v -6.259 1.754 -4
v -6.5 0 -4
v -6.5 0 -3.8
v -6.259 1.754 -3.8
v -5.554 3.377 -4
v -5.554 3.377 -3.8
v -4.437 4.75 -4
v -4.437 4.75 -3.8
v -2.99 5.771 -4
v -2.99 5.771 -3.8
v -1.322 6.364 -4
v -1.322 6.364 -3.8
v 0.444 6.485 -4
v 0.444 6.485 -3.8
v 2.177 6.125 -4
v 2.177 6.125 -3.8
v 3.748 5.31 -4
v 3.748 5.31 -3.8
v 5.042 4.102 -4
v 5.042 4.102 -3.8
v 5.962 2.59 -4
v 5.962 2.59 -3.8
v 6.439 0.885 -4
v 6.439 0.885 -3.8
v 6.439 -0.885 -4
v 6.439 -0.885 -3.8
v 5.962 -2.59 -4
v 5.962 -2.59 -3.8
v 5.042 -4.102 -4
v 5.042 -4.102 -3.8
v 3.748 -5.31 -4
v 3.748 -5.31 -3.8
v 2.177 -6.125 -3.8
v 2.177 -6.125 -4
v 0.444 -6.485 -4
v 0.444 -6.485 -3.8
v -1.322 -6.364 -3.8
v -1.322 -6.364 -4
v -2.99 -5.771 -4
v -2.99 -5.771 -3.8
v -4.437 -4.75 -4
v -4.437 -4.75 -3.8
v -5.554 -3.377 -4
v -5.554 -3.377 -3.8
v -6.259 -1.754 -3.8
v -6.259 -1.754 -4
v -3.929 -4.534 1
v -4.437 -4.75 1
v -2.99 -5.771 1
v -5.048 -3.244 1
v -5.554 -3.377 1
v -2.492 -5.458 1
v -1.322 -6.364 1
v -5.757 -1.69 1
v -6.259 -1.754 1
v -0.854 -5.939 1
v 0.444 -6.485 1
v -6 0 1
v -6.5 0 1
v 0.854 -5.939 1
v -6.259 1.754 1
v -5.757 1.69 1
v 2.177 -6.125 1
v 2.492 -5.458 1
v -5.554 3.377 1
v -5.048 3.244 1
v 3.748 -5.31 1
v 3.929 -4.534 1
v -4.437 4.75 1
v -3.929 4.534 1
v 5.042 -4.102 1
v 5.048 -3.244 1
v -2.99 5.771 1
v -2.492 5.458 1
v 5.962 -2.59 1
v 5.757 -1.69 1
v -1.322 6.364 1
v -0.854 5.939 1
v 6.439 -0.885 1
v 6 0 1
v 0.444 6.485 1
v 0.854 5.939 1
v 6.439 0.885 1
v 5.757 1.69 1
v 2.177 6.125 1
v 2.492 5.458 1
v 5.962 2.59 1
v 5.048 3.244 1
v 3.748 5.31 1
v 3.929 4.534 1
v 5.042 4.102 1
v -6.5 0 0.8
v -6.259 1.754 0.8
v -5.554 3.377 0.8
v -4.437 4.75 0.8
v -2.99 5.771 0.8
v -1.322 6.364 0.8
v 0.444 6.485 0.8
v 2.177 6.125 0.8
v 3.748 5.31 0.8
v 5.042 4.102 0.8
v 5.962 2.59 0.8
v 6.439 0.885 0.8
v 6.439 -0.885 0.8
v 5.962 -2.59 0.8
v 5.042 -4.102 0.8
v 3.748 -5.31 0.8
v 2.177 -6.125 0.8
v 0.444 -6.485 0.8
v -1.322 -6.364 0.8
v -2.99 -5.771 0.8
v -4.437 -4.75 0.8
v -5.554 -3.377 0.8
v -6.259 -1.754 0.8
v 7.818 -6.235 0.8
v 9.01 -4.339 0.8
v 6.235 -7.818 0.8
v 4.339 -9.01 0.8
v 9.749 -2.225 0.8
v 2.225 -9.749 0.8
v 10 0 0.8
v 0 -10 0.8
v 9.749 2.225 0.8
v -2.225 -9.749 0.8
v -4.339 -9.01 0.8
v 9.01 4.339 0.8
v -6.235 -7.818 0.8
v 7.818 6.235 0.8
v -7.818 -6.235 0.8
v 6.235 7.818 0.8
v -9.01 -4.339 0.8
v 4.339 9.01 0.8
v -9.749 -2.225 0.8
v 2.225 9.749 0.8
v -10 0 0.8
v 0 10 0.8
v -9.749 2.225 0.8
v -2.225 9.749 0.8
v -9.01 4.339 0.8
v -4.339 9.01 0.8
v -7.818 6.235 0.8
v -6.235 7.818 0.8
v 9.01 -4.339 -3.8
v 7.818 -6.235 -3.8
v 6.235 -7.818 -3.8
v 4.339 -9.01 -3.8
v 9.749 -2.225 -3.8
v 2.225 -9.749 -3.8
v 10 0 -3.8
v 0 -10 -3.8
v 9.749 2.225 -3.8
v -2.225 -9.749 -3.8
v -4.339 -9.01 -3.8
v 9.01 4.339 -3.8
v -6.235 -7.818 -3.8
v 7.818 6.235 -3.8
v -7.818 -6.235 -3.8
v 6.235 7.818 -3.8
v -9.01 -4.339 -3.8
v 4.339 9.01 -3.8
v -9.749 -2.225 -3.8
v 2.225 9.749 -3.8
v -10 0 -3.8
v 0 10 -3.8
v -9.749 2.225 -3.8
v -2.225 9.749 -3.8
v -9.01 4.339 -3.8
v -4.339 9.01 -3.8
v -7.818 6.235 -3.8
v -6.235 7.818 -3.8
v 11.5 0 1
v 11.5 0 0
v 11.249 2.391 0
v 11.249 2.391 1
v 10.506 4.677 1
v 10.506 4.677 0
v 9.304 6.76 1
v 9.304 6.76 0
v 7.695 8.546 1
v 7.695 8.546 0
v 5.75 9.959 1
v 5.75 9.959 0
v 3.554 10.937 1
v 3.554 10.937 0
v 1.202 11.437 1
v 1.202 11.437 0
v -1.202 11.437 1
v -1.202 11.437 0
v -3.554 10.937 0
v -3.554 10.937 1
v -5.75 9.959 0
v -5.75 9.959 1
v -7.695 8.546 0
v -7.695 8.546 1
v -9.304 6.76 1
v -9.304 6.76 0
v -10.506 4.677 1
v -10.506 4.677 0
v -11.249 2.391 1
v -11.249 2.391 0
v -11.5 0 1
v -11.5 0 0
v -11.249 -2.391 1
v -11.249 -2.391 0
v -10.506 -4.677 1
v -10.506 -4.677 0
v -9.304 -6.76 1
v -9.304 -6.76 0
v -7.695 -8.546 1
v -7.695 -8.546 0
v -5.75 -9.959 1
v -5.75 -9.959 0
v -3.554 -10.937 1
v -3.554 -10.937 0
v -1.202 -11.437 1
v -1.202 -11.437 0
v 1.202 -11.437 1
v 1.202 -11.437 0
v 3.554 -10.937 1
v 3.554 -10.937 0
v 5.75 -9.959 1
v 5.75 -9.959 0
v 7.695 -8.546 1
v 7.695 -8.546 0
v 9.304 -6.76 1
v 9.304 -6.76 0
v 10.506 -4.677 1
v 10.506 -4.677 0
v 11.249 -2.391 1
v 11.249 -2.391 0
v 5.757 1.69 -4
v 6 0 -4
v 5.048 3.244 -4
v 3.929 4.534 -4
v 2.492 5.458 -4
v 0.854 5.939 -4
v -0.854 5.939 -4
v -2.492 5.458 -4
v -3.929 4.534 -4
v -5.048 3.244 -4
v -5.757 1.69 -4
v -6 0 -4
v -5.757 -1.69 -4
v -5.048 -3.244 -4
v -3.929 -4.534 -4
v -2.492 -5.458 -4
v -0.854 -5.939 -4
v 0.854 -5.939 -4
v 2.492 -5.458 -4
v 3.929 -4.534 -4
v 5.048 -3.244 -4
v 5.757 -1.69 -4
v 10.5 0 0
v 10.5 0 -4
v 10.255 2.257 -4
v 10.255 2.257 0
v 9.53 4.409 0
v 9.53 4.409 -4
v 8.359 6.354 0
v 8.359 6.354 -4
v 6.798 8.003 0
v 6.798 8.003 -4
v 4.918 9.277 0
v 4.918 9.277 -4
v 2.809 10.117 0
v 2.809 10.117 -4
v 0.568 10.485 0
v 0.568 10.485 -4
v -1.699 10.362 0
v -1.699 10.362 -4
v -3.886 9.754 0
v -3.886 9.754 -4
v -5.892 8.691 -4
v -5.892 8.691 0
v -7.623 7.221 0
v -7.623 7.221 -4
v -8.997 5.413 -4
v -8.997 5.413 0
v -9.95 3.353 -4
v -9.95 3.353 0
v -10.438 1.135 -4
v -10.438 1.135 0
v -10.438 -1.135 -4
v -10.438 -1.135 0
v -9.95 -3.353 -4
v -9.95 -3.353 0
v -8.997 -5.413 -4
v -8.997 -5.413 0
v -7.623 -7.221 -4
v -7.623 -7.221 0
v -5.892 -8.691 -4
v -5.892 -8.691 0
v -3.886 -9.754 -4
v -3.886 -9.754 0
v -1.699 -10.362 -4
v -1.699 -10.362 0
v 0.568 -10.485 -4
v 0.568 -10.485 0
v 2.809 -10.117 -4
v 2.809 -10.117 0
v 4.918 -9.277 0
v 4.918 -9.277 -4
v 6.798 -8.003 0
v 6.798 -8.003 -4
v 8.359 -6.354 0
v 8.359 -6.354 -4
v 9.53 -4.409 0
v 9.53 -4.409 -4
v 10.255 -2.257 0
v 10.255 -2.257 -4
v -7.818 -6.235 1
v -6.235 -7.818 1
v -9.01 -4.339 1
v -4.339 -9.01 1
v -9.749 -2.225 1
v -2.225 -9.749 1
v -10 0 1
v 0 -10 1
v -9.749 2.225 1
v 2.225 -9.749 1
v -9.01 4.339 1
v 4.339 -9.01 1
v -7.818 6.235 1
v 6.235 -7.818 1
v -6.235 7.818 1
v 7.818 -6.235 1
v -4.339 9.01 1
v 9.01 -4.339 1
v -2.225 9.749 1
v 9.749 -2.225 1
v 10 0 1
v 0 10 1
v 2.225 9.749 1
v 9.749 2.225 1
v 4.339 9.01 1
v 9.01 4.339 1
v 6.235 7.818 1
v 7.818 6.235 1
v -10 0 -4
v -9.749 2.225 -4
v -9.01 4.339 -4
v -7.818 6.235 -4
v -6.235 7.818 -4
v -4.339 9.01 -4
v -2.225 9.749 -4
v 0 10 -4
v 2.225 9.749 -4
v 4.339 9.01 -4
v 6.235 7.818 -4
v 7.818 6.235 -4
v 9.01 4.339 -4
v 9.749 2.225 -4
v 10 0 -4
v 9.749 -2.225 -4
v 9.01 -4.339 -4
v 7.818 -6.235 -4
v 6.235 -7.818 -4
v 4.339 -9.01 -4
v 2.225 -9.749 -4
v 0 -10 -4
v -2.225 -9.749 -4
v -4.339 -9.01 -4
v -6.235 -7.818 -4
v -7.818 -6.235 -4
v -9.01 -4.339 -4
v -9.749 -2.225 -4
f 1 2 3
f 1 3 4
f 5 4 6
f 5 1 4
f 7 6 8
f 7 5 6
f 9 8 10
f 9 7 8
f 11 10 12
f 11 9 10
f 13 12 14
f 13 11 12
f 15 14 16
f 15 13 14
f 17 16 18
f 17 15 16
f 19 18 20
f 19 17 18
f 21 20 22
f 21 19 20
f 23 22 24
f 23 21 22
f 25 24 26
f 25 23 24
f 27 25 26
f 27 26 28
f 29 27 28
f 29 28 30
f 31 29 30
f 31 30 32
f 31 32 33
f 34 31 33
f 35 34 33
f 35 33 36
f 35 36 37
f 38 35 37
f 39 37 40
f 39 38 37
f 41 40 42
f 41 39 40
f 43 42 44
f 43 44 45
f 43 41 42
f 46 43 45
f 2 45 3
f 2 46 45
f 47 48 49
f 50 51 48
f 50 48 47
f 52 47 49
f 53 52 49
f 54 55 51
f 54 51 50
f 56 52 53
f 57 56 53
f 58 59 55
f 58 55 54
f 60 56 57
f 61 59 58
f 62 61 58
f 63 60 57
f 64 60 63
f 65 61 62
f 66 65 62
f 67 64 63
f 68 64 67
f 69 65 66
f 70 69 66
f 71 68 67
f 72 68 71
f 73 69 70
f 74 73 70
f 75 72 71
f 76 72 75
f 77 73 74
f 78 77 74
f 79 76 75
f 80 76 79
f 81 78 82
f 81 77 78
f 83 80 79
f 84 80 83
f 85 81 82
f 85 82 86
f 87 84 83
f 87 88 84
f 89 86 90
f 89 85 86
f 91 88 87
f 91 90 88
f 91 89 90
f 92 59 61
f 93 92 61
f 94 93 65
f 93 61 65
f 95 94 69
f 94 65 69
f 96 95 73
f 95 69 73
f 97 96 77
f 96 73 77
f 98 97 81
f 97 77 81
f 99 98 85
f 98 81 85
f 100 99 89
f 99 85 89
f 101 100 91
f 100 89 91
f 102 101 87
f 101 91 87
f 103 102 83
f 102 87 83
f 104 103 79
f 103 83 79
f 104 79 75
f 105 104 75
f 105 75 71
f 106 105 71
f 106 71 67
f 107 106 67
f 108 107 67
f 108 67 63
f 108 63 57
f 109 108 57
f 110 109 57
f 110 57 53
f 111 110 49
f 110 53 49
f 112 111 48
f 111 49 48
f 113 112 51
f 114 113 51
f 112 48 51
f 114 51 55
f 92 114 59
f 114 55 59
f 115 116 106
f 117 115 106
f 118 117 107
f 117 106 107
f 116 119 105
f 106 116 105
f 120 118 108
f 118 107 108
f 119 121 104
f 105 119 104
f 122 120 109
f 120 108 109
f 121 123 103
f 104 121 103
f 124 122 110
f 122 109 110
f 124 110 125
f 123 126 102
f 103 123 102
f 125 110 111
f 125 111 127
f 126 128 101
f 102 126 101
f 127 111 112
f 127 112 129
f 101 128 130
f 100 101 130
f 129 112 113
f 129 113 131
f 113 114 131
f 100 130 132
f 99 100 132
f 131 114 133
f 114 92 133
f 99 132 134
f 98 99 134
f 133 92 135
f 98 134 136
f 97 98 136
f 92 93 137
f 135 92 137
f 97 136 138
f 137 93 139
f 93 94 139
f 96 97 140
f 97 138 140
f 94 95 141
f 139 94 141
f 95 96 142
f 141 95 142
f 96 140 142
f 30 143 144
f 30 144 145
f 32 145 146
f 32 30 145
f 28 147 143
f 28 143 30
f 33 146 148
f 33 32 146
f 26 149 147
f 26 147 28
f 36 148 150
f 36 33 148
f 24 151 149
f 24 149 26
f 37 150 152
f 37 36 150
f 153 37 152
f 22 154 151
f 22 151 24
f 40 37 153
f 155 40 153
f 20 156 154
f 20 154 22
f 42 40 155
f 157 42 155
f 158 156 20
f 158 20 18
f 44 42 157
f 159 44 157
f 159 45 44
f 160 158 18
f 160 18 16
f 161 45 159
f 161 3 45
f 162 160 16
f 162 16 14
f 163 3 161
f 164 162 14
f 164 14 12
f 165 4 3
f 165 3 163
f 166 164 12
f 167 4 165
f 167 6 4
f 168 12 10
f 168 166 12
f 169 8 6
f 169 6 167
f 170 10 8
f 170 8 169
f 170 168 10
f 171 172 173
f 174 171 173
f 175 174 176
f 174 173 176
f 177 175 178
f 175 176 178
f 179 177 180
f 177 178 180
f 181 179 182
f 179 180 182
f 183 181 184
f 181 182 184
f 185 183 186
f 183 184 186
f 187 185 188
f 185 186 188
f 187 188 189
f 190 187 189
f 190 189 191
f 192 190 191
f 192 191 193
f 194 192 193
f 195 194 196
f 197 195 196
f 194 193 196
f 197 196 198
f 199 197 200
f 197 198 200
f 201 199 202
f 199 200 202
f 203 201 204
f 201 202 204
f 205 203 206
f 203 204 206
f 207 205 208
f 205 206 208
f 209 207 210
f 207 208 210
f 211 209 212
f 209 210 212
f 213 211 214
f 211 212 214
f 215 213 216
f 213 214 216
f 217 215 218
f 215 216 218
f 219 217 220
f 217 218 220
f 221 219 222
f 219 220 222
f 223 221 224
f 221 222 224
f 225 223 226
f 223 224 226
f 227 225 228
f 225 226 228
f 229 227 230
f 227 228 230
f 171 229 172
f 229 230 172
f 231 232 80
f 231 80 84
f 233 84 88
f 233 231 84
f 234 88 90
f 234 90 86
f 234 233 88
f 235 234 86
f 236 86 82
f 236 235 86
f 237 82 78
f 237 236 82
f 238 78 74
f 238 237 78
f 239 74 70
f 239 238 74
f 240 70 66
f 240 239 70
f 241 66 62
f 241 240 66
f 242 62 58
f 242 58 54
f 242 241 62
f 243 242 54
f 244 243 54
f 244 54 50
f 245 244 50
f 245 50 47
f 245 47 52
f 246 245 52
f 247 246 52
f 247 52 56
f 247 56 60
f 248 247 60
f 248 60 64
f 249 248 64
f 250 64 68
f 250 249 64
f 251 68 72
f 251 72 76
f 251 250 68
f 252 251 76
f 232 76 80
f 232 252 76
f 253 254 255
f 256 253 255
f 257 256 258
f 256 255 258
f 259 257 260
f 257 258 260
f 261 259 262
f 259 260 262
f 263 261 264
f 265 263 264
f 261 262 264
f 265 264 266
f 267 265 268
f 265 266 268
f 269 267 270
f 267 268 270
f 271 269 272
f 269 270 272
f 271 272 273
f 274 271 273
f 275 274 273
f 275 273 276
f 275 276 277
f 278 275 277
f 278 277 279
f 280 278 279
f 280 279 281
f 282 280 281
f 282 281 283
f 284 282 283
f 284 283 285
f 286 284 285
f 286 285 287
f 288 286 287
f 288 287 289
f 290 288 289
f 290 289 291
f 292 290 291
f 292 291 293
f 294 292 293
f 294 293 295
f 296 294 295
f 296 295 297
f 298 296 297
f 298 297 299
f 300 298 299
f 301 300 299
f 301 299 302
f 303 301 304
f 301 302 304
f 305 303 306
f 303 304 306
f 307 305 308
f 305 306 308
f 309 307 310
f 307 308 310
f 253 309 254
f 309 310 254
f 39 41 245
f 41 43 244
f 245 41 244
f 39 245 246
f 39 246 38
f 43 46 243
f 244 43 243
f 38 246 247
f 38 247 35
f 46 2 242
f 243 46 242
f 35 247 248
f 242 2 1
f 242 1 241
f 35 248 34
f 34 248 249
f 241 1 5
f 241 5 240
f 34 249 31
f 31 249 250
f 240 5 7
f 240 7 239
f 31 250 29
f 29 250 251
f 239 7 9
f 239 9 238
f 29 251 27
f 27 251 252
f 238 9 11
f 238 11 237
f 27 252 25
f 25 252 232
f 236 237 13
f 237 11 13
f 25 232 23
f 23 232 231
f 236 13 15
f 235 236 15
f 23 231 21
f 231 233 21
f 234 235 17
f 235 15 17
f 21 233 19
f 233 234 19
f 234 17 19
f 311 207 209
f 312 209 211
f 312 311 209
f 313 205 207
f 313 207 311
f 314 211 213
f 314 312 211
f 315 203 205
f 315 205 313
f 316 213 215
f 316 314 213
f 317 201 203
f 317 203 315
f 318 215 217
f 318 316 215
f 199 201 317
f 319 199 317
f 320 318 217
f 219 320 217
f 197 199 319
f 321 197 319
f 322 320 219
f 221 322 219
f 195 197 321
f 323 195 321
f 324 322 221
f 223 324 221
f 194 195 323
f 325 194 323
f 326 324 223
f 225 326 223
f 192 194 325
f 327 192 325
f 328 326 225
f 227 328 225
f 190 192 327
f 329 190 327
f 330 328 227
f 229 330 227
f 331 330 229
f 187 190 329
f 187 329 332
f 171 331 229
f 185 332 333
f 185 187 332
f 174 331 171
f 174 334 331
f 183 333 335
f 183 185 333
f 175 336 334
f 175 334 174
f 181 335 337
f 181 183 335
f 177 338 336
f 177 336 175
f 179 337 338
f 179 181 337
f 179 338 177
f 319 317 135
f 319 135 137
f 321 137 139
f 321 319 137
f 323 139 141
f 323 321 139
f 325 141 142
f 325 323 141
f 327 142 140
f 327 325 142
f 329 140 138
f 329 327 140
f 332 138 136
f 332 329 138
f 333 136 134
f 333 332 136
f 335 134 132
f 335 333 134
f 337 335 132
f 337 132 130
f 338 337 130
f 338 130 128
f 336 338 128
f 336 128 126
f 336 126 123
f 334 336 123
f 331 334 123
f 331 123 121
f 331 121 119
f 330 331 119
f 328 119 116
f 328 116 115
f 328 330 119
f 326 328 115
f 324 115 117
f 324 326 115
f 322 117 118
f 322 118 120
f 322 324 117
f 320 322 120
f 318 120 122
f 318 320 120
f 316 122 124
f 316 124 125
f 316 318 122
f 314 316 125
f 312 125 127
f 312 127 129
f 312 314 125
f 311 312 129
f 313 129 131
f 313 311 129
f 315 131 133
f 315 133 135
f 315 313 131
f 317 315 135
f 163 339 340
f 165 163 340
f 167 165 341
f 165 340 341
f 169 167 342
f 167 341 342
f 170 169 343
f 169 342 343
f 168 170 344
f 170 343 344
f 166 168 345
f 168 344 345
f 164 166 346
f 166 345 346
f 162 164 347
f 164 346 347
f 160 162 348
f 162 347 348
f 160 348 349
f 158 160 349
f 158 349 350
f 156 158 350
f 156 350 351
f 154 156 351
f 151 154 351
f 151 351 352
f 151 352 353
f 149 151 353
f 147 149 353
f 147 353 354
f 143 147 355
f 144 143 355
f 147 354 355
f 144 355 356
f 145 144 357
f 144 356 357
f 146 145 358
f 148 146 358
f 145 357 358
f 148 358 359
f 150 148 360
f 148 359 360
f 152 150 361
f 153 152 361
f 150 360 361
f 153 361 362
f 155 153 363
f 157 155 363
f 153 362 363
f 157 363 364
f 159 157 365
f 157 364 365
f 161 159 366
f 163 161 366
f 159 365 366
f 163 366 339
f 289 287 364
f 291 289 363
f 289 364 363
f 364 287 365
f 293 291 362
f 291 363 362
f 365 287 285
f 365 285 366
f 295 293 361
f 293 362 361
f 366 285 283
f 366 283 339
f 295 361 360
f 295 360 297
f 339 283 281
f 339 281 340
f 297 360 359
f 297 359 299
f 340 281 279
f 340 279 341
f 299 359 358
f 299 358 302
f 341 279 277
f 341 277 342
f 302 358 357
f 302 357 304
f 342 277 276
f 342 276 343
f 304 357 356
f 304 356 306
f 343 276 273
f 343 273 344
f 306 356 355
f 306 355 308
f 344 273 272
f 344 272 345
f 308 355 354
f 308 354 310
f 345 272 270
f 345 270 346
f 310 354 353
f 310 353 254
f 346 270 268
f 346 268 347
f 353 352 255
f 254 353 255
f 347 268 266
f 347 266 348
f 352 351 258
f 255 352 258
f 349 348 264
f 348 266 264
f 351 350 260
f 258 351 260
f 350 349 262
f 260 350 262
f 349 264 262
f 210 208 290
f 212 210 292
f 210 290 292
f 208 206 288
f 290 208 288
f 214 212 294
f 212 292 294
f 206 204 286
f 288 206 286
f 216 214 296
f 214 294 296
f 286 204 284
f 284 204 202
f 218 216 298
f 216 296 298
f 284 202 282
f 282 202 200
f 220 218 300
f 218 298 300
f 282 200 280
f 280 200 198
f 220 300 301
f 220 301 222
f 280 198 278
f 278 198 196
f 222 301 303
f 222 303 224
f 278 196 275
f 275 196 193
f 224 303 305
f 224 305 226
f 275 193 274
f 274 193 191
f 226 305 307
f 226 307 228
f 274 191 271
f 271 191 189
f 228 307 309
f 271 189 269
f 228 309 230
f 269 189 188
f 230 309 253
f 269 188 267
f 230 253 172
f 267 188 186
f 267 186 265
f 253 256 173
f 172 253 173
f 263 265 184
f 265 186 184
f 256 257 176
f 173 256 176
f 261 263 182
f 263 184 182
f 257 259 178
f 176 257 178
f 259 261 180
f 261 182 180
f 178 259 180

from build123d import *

# Parameters (mm, degrees)
SKETCH_1_R          = 11.5
SKETCH_1_R_2        = 10.5
EXTRUDE_1_DEPTH     = 1
EXTRUDE_START       = -5
SKETCH_2_R          = 10.5
SKETCH_2_R_2        = 6
EXTRUDE_2_DEPTH     = 5
SKETCH_3_R          = 10
SKETCH_3_R_2        = 6.5
CUT_EXTRUDE_1_DEPTH = 0.2


with BuildPart() as part:
    # 草图1 → 凸台-拉伸1 (new body)
    with BuildSketch(Plane.XY):
        Circle(SKETCH_1_R)
        Circle(SKETCH_1_R_2, mode=Mode.SUBTRACT)
    extrude(amount=EXTRUDE_1_DEPTH)

    # 草图2 → 凸台-拉伸2 (add)
    with BuildSketch(Plane.XY.offset(1).offset(EXTRUDE_START)):
        Circle(SKETCH_2_R)
        Circle(SKETCH_2_R_2, mode=Mode.SUBTRACT)
    extrude(amount=EXTRUDE_2_DEPTH)

    # 草图3 → 切除-拉伸1 (cut)
    with BuildSketch(Plane(origin=(0, 0, -4), x_dir=(-1, 0, 0), z_dir=(0, 0, -1))):
        Circle(SKETCH_3_R)
        Circle(SKETCH_3_R_2, mode=Mode.SUBTRACT)
    cut_extrude_1 = extrude(amount=-CUT_EXTRUDE_1_DEPTH, mode=Mode.SUBTRACT)

    # 镜向1: 切除-拉伸1 across plane
    add(cut_extrude_1.mirror(Plane(origin=(0, 0, -1.5), x_dir=(1, 0, 0), z_dir=(0, 0, -1))), mode=Mode.SUBTRACT)


solid = part.part
